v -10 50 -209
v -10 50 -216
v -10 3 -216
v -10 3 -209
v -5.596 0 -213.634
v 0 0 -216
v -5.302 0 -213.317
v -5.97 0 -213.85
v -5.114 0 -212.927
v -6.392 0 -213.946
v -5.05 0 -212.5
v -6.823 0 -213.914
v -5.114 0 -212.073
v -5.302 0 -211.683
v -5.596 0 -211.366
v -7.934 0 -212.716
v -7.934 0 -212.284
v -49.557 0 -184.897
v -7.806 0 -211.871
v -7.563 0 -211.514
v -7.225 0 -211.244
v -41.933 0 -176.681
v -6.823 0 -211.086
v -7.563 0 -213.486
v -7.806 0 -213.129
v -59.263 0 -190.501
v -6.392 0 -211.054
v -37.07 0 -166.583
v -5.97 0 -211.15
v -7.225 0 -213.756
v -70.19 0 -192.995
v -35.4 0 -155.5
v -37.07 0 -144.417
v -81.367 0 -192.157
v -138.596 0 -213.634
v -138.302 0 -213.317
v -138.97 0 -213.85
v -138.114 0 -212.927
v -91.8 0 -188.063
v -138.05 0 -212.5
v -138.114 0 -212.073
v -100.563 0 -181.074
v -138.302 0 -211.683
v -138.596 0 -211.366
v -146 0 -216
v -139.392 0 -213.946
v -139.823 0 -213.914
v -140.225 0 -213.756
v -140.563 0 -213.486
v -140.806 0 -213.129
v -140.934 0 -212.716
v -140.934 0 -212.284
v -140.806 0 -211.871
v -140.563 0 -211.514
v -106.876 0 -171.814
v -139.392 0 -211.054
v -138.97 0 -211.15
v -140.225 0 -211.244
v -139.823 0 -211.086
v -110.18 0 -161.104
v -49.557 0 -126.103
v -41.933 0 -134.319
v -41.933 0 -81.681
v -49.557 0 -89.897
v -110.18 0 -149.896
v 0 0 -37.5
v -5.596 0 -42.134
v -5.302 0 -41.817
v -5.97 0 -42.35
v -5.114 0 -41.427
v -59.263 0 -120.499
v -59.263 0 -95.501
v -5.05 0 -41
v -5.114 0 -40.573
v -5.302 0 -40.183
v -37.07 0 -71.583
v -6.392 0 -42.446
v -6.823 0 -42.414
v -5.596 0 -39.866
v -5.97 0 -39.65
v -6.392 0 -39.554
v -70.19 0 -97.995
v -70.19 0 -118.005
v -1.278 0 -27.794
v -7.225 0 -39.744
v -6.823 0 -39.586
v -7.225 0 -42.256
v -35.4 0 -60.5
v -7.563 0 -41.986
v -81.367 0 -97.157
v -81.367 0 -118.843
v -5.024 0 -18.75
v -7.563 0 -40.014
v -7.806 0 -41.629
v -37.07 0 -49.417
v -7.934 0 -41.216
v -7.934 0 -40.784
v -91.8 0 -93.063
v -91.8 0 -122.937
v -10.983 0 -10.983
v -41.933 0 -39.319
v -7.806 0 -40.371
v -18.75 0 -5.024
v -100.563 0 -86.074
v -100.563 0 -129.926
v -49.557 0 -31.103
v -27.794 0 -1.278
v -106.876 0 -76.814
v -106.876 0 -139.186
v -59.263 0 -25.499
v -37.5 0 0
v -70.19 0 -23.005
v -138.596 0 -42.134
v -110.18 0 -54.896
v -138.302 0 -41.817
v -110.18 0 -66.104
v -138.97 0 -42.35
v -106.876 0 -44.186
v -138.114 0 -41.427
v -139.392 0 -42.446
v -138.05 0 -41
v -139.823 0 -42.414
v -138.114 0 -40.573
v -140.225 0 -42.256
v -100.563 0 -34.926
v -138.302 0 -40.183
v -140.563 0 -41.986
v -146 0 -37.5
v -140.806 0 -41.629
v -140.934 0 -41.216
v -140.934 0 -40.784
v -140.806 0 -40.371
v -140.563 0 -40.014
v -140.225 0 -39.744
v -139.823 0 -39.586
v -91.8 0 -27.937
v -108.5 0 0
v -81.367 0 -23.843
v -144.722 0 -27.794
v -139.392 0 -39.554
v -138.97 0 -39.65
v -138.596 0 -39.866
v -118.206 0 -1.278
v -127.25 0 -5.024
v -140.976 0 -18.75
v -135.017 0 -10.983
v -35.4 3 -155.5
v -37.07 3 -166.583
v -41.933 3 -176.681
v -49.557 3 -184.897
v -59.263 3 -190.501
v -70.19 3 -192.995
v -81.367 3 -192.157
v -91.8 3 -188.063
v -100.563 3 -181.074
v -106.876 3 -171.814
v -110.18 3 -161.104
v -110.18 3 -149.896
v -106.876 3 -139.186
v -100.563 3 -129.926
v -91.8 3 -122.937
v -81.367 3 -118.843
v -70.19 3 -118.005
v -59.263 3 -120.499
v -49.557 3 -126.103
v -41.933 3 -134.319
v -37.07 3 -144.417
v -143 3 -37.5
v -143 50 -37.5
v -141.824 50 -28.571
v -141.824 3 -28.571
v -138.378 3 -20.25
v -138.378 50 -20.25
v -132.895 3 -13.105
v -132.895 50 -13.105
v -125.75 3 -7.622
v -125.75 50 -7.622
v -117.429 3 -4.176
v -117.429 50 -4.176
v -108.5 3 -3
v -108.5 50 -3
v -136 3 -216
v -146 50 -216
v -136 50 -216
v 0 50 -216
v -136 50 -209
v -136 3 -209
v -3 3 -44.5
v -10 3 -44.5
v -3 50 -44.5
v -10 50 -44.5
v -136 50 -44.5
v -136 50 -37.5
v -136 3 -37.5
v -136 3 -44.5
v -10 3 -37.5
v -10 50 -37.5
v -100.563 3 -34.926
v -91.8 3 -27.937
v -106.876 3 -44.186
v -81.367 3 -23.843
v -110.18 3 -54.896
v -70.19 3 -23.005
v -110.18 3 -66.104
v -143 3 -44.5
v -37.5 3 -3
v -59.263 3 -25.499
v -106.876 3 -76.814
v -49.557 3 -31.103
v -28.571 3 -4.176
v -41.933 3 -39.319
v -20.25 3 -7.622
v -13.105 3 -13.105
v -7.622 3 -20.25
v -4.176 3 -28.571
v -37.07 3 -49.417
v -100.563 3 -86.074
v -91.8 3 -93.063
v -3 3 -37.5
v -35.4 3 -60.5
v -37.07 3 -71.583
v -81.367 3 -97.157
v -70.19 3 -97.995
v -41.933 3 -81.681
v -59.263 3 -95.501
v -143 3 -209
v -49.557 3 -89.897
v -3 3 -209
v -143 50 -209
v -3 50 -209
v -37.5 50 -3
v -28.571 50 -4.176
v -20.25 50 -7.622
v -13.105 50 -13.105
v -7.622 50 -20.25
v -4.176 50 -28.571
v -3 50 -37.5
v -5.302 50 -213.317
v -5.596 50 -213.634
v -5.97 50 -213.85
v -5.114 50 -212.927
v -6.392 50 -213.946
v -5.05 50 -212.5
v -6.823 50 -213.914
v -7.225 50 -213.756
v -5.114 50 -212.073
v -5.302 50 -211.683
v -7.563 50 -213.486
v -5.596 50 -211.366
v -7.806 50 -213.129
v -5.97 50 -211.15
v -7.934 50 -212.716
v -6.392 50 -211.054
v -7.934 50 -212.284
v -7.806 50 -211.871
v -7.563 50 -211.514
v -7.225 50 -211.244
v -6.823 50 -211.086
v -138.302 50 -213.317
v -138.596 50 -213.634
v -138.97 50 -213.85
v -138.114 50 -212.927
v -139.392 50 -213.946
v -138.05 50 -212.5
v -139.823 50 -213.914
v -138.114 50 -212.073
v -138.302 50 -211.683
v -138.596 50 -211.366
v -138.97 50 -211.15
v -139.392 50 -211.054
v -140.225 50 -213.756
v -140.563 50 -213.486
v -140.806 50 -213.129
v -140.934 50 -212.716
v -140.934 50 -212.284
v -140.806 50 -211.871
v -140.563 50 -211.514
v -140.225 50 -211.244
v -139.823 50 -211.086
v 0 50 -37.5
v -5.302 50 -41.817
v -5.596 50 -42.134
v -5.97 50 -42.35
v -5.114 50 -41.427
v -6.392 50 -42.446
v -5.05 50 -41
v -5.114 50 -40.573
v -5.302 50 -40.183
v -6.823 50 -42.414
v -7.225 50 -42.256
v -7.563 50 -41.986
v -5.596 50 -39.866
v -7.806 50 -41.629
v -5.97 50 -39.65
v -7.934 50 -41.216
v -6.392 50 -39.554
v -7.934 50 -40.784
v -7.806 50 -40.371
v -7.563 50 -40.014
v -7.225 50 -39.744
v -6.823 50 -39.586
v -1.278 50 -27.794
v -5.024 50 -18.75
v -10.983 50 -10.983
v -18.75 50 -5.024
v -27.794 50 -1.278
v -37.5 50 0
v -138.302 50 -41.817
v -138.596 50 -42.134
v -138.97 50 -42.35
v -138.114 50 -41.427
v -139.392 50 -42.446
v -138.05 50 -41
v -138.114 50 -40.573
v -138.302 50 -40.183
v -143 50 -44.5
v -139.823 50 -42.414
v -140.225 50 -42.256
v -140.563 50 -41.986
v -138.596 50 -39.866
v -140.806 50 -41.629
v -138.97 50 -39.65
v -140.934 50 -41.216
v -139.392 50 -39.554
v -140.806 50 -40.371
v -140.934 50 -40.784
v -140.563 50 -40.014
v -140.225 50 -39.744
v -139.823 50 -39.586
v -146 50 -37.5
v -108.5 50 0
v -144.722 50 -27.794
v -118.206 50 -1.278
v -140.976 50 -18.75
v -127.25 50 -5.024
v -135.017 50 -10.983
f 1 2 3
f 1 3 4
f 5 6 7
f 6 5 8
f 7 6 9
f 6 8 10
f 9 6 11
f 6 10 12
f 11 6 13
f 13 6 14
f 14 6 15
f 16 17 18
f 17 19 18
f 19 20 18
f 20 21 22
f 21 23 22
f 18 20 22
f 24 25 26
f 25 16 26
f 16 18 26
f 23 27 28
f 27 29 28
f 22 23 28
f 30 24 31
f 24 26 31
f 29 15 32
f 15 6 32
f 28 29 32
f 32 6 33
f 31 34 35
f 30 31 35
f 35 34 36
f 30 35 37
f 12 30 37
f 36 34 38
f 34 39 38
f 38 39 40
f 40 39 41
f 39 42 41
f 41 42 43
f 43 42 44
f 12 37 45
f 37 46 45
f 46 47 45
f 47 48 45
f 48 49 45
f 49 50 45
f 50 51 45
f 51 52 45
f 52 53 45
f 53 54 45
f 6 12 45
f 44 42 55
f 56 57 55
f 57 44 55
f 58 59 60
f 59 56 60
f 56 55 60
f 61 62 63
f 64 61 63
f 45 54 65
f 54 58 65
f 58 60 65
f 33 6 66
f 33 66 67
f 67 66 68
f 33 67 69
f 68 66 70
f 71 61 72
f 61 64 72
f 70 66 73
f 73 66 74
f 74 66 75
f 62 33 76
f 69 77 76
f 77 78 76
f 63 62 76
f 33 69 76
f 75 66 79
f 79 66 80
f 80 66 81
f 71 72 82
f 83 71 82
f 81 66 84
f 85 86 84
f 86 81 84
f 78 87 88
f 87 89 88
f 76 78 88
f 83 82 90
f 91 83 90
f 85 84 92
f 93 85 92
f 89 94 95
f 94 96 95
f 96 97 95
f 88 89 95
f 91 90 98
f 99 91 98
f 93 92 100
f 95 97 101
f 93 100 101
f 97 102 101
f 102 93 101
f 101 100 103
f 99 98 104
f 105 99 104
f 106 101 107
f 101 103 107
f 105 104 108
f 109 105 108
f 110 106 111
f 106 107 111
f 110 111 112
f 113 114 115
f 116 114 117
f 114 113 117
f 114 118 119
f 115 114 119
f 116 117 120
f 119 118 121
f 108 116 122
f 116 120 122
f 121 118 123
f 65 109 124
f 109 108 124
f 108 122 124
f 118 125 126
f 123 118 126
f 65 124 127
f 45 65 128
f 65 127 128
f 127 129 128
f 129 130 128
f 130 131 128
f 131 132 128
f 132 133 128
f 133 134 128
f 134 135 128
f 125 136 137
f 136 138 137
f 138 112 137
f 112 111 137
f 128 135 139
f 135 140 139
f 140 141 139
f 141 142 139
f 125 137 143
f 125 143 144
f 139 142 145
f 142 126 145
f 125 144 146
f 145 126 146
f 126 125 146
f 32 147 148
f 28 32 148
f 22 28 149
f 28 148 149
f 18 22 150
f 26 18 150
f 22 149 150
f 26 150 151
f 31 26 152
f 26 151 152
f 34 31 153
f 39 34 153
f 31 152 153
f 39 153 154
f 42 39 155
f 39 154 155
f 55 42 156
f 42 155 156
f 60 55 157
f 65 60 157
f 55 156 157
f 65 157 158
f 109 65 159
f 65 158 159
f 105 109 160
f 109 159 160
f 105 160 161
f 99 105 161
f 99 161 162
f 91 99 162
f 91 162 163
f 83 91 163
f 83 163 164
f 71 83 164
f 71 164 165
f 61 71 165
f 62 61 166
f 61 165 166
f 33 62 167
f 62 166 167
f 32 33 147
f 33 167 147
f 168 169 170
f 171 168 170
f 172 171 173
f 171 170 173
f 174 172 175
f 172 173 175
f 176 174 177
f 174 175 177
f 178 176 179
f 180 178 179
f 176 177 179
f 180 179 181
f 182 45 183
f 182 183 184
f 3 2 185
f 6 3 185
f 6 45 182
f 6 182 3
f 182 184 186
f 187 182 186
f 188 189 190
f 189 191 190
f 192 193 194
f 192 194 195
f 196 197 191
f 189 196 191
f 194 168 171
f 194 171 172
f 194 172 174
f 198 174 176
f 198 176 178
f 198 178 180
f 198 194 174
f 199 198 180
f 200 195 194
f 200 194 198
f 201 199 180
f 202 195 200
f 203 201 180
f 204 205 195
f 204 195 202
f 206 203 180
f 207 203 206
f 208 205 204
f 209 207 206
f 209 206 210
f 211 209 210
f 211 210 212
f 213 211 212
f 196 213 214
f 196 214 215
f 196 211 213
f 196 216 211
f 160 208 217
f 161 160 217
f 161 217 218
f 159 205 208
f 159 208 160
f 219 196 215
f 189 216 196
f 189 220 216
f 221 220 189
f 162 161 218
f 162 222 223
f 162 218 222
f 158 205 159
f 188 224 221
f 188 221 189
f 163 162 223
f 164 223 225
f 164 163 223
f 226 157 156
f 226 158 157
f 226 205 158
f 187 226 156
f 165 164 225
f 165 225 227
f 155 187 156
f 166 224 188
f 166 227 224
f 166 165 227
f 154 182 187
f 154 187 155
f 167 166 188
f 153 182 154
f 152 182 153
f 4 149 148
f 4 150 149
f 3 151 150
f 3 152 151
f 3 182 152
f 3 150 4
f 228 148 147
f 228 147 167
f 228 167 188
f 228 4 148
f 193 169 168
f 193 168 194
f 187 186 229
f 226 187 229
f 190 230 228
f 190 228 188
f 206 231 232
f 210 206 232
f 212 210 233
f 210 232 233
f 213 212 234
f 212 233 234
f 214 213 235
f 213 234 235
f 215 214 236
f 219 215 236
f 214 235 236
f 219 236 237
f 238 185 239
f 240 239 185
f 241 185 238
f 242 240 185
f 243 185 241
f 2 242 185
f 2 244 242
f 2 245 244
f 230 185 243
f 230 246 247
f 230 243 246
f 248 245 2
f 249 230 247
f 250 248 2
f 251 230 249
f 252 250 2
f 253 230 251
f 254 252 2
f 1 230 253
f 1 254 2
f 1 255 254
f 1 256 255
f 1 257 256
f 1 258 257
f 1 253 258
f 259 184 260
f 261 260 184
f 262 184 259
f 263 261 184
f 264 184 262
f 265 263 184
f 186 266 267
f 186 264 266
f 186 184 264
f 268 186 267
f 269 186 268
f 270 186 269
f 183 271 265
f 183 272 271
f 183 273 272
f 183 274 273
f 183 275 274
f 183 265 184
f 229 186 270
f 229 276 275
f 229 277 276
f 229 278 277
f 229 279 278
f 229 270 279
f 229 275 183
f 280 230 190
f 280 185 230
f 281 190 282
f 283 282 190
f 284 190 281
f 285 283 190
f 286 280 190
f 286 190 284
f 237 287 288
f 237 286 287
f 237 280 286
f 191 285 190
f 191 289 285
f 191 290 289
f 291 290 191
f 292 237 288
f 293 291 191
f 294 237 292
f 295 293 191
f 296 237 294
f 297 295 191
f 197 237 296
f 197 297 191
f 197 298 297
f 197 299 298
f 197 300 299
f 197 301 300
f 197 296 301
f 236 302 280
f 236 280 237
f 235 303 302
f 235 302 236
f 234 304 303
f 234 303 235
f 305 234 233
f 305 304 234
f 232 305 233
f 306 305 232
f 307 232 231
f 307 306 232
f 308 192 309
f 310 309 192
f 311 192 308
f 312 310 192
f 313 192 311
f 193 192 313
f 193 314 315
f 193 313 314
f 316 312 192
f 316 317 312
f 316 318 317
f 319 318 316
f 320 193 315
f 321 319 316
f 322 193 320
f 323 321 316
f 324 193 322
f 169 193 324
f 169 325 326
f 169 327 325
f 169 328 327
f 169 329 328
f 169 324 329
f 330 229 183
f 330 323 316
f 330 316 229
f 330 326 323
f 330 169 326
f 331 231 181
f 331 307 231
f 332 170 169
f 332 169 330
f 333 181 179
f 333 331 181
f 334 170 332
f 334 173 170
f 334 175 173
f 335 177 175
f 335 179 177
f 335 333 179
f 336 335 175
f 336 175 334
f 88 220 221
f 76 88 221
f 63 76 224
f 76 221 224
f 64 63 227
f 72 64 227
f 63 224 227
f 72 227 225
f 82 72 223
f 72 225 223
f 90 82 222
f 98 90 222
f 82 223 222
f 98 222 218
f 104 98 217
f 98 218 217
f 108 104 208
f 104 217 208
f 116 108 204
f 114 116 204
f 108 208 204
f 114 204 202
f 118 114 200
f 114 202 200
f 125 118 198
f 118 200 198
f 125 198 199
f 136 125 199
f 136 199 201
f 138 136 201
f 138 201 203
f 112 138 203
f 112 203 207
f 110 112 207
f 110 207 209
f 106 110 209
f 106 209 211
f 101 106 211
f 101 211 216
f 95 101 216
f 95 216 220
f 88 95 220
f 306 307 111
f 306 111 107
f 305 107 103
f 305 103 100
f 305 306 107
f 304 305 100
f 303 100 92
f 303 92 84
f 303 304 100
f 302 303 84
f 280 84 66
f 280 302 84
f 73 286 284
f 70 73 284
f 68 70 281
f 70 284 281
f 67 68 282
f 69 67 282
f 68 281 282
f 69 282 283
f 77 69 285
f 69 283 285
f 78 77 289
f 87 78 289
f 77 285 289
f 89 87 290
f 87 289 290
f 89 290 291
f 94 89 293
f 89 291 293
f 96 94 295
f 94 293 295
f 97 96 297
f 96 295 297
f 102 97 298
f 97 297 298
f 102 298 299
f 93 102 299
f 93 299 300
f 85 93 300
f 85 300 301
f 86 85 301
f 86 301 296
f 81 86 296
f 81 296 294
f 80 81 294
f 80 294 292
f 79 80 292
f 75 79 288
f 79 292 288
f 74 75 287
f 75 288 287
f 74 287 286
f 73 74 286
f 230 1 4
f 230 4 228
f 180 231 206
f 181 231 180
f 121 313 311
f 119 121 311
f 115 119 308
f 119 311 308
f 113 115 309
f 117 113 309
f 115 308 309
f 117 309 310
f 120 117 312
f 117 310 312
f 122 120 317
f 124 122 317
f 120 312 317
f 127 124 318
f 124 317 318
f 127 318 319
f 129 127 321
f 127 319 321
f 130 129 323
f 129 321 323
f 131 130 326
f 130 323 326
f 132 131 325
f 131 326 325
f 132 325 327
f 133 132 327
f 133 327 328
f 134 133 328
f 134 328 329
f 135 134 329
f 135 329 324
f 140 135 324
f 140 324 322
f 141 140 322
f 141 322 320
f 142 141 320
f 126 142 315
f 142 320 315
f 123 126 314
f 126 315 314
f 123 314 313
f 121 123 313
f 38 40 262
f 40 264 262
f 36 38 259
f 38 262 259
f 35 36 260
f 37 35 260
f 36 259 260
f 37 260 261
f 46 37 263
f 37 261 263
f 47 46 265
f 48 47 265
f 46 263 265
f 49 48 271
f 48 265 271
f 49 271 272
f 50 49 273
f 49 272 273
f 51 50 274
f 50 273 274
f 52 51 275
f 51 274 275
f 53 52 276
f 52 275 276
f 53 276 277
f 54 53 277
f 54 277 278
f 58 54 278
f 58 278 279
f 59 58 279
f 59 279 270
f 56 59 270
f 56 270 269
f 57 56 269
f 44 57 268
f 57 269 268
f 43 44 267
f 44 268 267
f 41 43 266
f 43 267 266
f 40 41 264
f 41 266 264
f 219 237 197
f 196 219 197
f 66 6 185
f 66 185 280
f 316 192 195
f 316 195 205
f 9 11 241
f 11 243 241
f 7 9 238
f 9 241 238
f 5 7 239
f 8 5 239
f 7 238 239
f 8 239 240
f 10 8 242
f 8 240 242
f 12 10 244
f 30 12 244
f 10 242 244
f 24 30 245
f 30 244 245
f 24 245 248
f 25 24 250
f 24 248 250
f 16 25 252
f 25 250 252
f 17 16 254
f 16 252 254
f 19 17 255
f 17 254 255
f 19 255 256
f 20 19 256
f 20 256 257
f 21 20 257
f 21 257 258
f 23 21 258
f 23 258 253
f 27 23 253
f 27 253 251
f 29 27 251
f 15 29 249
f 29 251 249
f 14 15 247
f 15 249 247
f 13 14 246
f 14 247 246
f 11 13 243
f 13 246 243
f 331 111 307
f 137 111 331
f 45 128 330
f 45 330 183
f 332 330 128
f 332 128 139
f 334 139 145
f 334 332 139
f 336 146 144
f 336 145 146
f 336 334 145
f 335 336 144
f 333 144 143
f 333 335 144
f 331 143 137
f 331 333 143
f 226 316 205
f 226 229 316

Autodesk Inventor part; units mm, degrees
ref_plane "YZ Plane" through (0, 0, 0) normal (1, 0, 0) x (0, 1, 0)
ref_plane "XZ Plane" through (0, 0, 0) normal (0, 1, 0) x (-1, 0, 0)
ref_plane "XY Plane" through (0, 0, 0) normal (0, 0, 1) x (1, 0, 0)
sketch "Sketch1" plane through (0, 0, 0) normal (0, 1, 0) x (-1, 0, 0)
  line L0 (0, 0) -> (146, 0)
  line L1 (146, 0) -> (146, -216)
  line L2 (146, -216) -> (0, -216)
  line L3 (0, -216) -> (0, 0)
  dimension "d0" = 146
  dimension "d1" = 216
extrude "Extrusion1" add sketch "Sketch1" along normal blind 50
sketch "Sketch2" plane through (0, 50, 0) normal (0, 1, 0) x (1, 0, 0)
  point P0 (0, 0)
fillet "Fillet1" radius 37.5 2 edges at (-146, 25, 0) (0, 25, 0)
sketch "Sketch3" plane through (0, 50, 0) normal (0, 1, 0) x (1, 0, 0)
  line L0 (0, 216) -> (-146, 216) projected
  line L1 (-146, 216) -> (0, 216)
  line L2 (0, 216) -> (0, 37.5)
  line L3 (-37.5, 0) -> (-108.5, 0)
  line L4 (-146, 37.5) -> (-146, 216)
  arc A0 (-146, 37.5) -> (-108.5, 0) centre (-108.5, 37.5) ccw
  arc A1 (-37.5, 0) -> (0, 37.5) centre (-37.5, 37.5) ccw
  line L5 (-143, 213) -> (-3, 213)
  line L6 (-3, 213) -> (-3, 37.5)
  arc A2 (-37.5, 3) -> (-3, 37.5) centre (-37.5, 37.5) ccw
  line L7 (-37.5, 3) -> (-108.5, 3)
  arc A3 (-143, 37.5) -> (-108.5, 3) centre (-108.5, 37.5) ccw
  line L8 (-143, 37.5) -> (-143, 213)
  point P0 (0, 0)
  dimension "d5" = 37.5
  dimension "d6" = 3
extrude "Extrusion2" cut sketch "Sketch3" against normal blind 47 contours L5 L6 A2 L7 A3 L8
sketch "Sketch4" plane through (0, 3, 0) normal (0, 1, 0) x (1, 0, 0)
  circle A0 centre (-73, 60.5) radius 37.6
  circle A1 centre (-73, 155.5) radius 37.6
  line L0 (-37.5, 3) -> (-108.5, 3) projected
  line L1 (-3, 213) -> (-3, 37.5) projected
  line L2 (-143, 37.5) -> (-143, 213) projected
  point P0 (0, 0)
  dimension "d9" = 75.2
  dimension "d10" = 75.2
  dimension "d11" = 95
  dimension "d12" = 57.5
  dimension "d13" = 140
  dimension "d14" = 70
  dimension "d15" = 70
extrude "Extrusion3" cut sketch "Sketch4" against normal blind 47
sketch "Sketch5" plane through (0, 0, -216) normal (0, 0, -1) x (-1, 0, 0)
  line L0 (3, 50) -> (37.5, 50) projected
  line L1 (108.5, 3) -> (143, 3) projected
  line L2 (3, 50) -> (143, 50)
  line L3 (143, 50) -> (143, 3)
  line L4 (143, 3) -> (3, 3)
  line L5 (3, 3) -> (3, 50)
  point P0 (0, 0)
  point P1 (37.5, 50)
extrude "Extrusion4" cut sketch "Sketch5" against normal blind 3
sketch "Sketch6" plane through (0, 50, 0) normal (0, 1, 0) x (1, 0, 0)
  arc A0 (-143, 37.5) -> (-108.5, 3) centre (-108.5, 37.5) ccw projected
  line L0 (-143, 37.5) -> (-136, 37.5)
  line L1 (-136, 37.5) -> (-136, 44.5)
  line L2 (-136, 44.5) -> (-143, 44.5)
  line L3 (-143, 44.5) -> (-143, 37.5)
  line L4 (-3, 37.5) -> (-10, 37.5)
  line L5 (-10, 37.5) -> (-10, 44.5)
  line L6 (-10, 44.5) -> (-3, 44.5)
  line L7 (-3, 44.5) -> (-3, 37.5)
  line L8 (-143, 37.5) -> (-143, 216) projected
  line L9 (-143, 216) -> (-136, 216)
  line L10 (-136, 216) -> (-136, 209)
  line L11 (-136, 209) -> (-143, 209)
  line L12 (-143, 209) -> (-143, 216)
  line L13 (-3, 216) -> (-3, 37.5) projected
  line L14 (-3, 216) -> (-10, 216)
  line L15 (-10, 216) -> (-10, 209)
  line L16 (-10, 209) -> (-3, 209)
  line L17 (-3, 209) -> (-3, 216)
  point P0 (0, 0)
  point P1 (-3, 209)
  dimension "d20" = 7
  dimension "d21" = 7
  dimension "d22" = 7
  dimension "d23" = 7
  dimension "d24" = 7
  dimension "d25" = 7
  dimension "d26" = 7
  dimension "d27" = 7
extrude "Extrusion5" add sketch "Sketch6" against normal blind 50
sketch "Sketch7" plane through (0, 50, 0) normal (0, 1, 0) x (1, 0, 0)
  circle A0 centre (-139.5, 41) radius 1.45
  line L0 (-136, 44.5) -> (-143, 44.5) projected
  line L1 (-136, 37.5) -> (-136, 44.5) projected
  circle A1 centre (-139.5, 212.5) radius 1.45
  line L2 (-136, 216) -> (-146, 216) projected
  line L3 (-136, 209) -> (-136, 216) projected
  circle A2 centre (-6.5, 212.5) radius 1.45
  line L4 (-10, 216) -> (-10, 209) projected
  line L5 (-10, 209) -> (-3, 209) projected
  circle A3 centre (-6.5, 41) radius 1.45
  line L6 (-10, 44.5) -> (-10, 37.5) projected
  line L7 (-10, 37.5) -> (-3, 37.5) projected
  point P0 (0, 0)
  dimension "d34" = 2.9
  dimension "d35" = 3.5
  dimension "d36" = 3.5
  dimension "d37" = 2.9
  dimension "d38" = 3.5
  dimension "d39" = 3.5
  dimension "d40" = 2.9
  dimension "d41" = 3.5
  dimension "d42" = 3.5
  dimension "d43" = 2.9
  dimension "d44" = 3.5
  dimension "d45" = 3.5
extrude "Extrusion6" cut sketch "Sketch7" against normal blind 50
equation "\"d14\" = 0.5 * d13"
equation "\"d15\" = d14"
